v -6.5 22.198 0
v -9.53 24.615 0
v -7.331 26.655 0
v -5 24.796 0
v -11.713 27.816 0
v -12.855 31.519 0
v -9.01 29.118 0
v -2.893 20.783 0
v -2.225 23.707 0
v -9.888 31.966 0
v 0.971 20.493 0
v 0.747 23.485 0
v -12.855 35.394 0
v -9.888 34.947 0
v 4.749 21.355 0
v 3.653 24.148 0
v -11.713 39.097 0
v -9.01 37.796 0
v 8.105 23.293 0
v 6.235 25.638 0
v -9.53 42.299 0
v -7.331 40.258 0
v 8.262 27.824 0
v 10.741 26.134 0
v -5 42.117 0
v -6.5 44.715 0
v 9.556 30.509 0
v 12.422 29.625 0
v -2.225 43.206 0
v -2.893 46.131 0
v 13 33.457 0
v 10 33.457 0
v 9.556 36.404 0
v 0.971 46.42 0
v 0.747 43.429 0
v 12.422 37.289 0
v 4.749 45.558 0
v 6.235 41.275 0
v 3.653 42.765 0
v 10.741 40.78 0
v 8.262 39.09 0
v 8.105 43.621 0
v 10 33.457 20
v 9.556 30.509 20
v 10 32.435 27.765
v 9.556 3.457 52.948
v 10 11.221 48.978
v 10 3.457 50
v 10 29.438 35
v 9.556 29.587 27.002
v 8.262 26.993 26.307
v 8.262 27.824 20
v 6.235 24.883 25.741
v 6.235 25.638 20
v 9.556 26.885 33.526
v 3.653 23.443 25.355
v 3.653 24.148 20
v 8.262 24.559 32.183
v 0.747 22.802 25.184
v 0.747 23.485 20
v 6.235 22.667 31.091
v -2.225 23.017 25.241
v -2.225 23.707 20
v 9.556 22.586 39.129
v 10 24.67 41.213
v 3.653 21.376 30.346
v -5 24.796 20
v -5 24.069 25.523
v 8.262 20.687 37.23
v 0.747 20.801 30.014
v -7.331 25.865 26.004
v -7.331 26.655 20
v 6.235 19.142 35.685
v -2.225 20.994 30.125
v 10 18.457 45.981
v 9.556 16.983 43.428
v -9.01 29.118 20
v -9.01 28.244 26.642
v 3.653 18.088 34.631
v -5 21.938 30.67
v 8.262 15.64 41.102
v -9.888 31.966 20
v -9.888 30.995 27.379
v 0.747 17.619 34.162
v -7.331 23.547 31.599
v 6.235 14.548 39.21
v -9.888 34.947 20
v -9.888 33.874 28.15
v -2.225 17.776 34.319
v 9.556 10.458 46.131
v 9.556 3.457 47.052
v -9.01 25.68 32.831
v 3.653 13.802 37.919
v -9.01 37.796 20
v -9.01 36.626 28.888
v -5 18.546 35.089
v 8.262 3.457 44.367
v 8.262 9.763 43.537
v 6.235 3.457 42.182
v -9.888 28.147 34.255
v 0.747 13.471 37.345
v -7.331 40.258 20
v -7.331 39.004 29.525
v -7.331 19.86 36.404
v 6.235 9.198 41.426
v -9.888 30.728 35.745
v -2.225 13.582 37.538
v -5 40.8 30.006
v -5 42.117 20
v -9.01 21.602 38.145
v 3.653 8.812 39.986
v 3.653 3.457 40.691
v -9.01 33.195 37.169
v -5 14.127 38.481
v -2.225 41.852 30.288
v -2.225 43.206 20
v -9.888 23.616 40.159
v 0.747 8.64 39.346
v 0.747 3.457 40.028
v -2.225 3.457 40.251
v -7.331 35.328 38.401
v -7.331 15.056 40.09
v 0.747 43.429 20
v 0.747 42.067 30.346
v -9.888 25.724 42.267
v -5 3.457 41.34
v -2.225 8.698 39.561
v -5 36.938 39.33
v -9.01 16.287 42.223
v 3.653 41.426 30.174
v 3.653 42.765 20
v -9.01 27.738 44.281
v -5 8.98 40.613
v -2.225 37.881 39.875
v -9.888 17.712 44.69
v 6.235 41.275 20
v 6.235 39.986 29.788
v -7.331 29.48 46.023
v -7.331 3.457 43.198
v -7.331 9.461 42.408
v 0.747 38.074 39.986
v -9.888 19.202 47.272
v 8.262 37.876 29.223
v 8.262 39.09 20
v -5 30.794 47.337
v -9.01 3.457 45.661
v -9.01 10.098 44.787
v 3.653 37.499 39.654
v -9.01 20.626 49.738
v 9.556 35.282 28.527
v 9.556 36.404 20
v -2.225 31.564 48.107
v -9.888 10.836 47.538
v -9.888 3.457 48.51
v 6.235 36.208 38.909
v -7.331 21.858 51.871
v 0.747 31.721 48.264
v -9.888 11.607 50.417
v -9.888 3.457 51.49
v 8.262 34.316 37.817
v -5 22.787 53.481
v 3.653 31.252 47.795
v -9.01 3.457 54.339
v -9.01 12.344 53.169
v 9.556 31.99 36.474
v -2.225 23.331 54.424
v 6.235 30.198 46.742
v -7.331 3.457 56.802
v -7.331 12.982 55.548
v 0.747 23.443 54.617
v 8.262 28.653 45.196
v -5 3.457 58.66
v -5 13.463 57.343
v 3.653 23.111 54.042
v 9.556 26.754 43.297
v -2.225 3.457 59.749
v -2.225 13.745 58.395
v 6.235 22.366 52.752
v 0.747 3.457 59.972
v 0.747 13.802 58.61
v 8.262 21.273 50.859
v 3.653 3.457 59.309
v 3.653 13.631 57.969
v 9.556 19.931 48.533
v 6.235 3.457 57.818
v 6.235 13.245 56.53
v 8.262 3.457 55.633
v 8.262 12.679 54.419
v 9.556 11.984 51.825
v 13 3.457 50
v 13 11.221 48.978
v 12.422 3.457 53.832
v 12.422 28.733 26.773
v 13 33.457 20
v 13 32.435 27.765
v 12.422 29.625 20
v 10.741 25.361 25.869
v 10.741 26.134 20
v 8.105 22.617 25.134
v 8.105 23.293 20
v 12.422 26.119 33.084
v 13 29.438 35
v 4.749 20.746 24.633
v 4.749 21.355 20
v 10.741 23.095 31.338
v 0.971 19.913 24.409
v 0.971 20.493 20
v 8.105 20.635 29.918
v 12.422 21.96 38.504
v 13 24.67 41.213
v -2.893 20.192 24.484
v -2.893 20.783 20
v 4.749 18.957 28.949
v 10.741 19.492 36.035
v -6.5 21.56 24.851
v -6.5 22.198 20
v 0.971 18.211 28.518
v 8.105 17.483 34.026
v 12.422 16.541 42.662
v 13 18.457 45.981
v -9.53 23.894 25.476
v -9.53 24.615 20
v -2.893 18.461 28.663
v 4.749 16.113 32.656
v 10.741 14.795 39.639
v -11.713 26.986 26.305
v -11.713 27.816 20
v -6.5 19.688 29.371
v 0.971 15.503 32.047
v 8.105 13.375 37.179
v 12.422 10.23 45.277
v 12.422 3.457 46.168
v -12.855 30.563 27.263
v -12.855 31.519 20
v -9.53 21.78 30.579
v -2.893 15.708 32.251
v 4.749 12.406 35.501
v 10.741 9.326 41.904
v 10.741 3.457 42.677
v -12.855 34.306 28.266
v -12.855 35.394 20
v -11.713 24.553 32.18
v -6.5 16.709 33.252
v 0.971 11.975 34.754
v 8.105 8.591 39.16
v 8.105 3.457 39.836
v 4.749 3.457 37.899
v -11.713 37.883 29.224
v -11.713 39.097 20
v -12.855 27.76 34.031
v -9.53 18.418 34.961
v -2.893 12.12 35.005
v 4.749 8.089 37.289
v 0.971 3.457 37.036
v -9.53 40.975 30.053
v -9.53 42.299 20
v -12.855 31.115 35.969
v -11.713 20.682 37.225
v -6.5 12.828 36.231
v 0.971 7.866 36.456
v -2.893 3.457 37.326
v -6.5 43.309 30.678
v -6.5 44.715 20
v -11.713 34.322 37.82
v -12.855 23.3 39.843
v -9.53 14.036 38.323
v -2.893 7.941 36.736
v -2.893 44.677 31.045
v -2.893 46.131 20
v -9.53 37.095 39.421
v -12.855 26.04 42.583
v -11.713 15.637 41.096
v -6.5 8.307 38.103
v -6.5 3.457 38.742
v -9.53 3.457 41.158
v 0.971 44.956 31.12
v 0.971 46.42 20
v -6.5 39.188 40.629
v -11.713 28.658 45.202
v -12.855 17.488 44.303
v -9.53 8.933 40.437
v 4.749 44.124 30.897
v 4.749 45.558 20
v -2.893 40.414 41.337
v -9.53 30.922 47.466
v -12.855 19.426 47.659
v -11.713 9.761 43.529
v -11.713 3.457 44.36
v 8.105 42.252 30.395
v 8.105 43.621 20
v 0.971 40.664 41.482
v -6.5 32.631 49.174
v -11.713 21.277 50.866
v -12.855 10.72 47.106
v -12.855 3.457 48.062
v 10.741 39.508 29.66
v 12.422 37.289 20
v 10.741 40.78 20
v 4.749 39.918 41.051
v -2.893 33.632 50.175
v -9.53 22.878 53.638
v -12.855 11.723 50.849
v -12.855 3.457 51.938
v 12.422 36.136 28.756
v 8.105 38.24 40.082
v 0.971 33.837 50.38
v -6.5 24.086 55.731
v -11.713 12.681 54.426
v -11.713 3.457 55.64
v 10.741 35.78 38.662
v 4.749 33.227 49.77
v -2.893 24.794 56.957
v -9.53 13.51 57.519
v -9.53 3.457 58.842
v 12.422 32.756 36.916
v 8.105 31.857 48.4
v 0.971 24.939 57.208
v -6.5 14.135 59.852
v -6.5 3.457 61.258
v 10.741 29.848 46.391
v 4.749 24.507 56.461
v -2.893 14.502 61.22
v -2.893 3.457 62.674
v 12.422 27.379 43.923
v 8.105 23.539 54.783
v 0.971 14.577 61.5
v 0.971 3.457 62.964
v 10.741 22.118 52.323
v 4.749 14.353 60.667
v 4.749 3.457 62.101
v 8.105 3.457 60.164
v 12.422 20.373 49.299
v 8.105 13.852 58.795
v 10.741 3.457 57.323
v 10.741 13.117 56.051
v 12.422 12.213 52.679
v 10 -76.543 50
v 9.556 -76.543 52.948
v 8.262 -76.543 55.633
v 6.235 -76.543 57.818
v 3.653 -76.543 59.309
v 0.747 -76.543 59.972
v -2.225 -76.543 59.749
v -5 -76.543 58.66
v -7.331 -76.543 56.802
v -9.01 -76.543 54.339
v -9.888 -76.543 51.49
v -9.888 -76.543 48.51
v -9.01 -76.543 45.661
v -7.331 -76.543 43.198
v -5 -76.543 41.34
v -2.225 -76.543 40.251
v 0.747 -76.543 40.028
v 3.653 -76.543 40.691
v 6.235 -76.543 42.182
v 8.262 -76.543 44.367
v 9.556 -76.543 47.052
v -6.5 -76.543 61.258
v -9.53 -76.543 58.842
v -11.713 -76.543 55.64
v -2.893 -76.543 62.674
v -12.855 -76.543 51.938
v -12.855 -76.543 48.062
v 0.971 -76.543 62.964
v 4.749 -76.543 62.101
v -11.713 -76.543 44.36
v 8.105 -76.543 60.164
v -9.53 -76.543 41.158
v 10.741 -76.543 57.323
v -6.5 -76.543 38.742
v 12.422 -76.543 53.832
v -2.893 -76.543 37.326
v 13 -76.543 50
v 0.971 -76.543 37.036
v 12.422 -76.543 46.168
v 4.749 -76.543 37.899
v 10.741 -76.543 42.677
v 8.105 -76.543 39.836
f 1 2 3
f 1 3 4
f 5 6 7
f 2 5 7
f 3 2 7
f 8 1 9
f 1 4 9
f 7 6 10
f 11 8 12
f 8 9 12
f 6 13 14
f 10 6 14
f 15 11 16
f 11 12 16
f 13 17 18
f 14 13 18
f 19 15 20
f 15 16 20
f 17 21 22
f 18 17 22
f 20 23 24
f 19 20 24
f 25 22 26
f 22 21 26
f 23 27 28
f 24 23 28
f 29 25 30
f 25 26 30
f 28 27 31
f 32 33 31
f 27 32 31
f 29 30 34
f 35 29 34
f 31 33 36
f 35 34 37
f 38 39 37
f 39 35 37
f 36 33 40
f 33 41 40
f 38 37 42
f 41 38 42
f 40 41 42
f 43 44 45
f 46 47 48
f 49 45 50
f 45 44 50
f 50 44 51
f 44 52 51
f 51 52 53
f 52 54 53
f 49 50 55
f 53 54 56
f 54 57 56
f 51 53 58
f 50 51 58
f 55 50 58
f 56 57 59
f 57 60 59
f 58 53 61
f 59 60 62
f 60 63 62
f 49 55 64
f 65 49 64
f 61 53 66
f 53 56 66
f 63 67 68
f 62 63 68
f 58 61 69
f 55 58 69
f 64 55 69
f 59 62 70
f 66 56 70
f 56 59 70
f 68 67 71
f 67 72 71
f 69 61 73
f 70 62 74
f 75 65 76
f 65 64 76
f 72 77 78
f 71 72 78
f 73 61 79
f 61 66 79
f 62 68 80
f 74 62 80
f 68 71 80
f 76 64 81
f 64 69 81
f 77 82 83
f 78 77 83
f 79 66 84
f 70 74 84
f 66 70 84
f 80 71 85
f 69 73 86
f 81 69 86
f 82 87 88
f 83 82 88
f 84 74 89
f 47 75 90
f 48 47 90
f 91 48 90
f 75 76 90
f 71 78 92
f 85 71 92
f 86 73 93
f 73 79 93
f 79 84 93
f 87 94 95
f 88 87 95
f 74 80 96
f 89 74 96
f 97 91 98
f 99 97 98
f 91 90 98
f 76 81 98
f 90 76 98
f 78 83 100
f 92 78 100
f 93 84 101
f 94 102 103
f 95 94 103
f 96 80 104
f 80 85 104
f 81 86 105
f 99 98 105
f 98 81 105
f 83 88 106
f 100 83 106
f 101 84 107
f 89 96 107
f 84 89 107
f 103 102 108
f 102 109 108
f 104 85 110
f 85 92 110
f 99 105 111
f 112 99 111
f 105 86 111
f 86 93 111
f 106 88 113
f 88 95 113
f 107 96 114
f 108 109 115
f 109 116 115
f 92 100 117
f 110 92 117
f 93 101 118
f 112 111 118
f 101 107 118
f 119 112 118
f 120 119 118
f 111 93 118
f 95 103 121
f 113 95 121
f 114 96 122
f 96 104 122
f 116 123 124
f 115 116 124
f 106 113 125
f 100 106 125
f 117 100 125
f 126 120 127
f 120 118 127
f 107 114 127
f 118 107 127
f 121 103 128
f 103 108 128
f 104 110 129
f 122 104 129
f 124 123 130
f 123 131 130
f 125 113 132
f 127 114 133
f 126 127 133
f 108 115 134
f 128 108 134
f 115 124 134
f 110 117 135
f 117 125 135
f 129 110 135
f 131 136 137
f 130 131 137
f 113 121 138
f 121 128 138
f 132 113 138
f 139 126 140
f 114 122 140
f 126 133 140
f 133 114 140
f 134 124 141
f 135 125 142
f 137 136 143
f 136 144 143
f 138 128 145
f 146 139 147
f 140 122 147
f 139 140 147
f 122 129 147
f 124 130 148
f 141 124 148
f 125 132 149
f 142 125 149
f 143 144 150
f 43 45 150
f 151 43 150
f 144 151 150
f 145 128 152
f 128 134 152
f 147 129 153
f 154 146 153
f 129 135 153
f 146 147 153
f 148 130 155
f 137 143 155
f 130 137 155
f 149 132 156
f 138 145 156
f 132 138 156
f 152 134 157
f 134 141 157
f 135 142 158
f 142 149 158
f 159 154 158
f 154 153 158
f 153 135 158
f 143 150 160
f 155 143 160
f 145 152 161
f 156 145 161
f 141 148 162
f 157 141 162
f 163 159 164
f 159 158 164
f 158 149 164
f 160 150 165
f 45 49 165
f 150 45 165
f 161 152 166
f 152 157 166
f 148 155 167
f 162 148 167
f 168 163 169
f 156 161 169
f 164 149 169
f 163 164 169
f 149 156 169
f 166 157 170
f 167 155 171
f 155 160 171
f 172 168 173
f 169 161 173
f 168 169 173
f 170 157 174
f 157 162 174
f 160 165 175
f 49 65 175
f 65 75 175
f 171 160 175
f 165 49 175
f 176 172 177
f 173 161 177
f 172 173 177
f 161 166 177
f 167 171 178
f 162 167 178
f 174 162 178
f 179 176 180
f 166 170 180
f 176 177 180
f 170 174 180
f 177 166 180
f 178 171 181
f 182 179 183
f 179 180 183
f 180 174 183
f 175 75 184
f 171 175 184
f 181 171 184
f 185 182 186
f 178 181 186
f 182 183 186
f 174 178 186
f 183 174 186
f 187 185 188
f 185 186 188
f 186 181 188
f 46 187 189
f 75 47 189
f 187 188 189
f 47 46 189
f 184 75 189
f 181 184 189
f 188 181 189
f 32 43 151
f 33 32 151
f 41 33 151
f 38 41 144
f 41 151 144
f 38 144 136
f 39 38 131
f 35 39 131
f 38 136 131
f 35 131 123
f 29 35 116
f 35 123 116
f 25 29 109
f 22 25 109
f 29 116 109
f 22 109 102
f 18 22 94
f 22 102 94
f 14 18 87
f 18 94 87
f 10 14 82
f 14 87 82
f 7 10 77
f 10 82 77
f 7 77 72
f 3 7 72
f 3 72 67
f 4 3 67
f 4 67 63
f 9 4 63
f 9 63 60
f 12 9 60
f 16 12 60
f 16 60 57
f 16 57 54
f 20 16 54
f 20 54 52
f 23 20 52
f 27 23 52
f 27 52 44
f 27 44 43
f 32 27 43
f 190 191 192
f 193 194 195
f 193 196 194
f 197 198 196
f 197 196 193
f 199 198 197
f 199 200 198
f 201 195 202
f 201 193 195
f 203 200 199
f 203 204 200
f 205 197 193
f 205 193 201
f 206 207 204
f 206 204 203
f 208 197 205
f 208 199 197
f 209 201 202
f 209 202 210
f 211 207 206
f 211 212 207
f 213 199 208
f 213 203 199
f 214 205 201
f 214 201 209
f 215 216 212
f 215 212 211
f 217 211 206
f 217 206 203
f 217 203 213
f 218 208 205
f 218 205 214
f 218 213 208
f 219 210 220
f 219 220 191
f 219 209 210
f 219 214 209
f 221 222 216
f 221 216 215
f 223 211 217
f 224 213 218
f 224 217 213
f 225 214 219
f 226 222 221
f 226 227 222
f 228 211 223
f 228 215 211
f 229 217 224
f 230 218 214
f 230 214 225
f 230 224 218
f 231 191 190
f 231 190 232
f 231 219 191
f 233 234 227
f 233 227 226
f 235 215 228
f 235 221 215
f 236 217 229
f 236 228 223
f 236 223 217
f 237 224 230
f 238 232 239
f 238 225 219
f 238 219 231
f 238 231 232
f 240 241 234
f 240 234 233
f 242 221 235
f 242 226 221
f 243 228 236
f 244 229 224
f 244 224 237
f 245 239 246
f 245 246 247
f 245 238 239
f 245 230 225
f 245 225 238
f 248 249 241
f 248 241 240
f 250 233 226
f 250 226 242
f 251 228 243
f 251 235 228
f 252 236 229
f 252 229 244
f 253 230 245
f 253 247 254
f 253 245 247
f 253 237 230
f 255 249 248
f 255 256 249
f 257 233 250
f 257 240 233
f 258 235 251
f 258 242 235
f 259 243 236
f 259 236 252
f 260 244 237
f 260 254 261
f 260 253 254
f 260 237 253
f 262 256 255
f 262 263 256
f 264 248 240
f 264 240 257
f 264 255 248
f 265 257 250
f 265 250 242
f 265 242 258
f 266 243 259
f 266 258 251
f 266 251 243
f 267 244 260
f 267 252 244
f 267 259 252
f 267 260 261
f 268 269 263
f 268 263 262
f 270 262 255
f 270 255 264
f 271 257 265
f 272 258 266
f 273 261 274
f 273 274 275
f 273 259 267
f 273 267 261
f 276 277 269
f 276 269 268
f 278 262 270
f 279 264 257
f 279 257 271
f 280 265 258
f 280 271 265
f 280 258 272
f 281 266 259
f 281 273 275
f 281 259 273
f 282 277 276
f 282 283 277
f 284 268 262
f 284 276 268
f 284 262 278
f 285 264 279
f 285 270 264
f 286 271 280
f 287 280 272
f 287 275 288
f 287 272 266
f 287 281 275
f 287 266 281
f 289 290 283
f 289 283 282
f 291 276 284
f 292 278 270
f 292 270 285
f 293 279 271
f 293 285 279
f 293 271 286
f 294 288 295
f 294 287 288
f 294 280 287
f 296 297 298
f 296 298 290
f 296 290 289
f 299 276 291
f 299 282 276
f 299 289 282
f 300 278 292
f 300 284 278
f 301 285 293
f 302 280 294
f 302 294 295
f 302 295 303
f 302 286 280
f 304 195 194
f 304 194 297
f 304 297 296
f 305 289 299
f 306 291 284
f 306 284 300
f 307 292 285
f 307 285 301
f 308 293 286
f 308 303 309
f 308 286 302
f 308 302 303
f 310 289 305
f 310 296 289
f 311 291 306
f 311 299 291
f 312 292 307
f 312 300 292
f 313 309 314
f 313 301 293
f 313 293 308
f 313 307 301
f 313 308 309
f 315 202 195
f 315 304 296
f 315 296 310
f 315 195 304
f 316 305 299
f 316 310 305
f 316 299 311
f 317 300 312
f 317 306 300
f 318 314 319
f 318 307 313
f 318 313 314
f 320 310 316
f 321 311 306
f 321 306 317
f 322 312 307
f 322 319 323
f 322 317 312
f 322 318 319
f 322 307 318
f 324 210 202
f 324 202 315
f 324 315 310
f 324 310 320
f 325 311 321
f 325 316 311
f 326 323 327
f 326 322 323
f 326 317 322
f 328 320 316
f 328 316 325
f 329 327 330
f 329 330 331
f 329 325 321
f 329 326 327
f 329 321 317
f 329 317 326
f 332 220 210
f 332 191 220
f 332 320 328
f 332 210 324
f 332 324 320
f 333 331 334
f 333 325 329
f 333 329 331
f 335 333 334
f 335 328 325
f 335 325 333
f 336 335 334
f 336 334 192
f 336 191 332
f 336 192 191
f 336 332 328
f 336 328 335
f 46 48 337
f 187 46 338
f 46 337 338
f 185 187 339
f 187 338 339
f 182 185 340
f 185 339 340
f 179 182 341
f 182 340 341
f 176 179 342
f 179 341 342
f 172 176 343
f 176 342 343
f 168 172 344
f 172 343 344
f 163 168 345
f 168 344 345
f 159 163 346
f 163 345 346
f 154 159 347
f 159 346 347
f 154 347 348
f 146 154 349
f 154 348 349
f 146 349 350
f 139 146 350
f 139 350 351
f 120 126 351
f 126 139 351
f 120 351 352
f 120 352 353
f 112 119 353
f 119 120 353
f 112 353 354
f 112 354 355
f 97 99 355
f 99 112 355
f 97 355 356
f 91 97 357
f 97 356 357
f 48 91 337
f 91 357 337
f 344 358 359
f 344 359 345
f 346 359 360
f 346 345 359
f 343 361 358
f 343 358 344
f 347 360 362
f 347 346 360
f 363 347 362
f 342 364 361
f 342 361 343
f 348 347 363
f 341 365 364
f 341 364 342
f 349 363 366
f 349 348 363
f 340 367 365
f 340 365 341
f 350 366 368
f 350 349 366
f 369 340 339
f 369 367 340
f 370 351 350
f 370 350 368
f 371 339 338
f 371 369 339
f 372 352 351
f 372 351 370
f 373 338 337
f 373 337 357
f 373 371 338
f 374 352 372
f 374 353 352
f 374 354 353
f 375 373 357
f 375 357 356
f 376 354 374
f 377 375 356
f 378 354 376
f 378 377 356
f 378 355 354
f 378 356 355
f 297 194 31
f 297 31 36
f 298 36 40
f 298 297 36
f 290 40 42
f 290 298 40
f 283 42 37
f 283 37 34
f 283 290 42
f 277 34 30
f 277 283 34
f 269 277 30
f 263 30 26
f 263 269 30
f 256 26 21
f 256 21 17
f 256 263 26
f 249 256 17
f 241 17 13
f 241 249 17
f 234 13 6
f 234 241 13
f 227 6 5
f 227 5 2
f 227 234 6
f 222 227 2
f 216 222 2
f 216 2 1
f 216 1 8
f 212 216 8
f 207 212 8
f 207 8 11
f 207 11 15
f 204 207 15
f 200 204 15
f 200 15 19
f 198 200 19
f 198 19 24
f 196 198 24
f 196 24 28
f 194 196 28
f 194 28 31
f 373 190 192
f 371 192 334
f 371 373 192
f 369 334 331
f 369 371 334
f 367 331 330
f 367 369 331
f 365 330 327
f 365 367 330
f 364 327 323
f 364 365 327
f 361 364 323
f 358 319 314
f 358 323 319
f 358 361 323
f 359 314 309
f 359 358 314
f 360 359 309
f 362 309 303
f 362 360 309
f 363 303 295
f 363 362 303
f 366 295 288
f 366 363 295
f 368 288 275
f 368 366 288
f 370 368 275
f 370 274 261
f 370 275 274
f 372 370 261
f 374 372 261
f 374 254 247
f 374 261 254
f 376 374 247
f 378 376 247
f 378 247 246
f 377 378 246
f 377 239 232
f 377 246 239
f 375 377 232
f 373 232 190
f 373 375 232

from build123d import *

# Parameters (mm, degrees)
SKETCH2_R   = 13
SKETCH2_R_2 = 10


with BuildPart() as part:
    # Sweep-Thin1: sweep along a path in Sketch1
    with BuildLine(Plane(origin=(0, 0, 0), x_dir=(0, 0, -1), z_dir=(1, 0, 0))) as sweep_thin1_path:
        Line((0, 33.456749572), (-20, 33.456749572))
        ThreePointArc((-20, 33.456749572), (-41.213203436, 24.669953007), (-50, 3.456749572))
        Line((-50, 3.456749572), (-50, -76.543250428))
    # Sketch2 → Sweep-Thin1 (sweep)
    with BuildSketch(Plane.XY):
        with Locations((0, 33.456749572)):
            Circle(SKETCH2_R)
        with Locations((0, 33.456749572)):
            Circle(SKETCH2_R_2, mode=Mode.SUBTRACT)
    sweep(path=sweep_thin1_path.line)


solid = part.part
